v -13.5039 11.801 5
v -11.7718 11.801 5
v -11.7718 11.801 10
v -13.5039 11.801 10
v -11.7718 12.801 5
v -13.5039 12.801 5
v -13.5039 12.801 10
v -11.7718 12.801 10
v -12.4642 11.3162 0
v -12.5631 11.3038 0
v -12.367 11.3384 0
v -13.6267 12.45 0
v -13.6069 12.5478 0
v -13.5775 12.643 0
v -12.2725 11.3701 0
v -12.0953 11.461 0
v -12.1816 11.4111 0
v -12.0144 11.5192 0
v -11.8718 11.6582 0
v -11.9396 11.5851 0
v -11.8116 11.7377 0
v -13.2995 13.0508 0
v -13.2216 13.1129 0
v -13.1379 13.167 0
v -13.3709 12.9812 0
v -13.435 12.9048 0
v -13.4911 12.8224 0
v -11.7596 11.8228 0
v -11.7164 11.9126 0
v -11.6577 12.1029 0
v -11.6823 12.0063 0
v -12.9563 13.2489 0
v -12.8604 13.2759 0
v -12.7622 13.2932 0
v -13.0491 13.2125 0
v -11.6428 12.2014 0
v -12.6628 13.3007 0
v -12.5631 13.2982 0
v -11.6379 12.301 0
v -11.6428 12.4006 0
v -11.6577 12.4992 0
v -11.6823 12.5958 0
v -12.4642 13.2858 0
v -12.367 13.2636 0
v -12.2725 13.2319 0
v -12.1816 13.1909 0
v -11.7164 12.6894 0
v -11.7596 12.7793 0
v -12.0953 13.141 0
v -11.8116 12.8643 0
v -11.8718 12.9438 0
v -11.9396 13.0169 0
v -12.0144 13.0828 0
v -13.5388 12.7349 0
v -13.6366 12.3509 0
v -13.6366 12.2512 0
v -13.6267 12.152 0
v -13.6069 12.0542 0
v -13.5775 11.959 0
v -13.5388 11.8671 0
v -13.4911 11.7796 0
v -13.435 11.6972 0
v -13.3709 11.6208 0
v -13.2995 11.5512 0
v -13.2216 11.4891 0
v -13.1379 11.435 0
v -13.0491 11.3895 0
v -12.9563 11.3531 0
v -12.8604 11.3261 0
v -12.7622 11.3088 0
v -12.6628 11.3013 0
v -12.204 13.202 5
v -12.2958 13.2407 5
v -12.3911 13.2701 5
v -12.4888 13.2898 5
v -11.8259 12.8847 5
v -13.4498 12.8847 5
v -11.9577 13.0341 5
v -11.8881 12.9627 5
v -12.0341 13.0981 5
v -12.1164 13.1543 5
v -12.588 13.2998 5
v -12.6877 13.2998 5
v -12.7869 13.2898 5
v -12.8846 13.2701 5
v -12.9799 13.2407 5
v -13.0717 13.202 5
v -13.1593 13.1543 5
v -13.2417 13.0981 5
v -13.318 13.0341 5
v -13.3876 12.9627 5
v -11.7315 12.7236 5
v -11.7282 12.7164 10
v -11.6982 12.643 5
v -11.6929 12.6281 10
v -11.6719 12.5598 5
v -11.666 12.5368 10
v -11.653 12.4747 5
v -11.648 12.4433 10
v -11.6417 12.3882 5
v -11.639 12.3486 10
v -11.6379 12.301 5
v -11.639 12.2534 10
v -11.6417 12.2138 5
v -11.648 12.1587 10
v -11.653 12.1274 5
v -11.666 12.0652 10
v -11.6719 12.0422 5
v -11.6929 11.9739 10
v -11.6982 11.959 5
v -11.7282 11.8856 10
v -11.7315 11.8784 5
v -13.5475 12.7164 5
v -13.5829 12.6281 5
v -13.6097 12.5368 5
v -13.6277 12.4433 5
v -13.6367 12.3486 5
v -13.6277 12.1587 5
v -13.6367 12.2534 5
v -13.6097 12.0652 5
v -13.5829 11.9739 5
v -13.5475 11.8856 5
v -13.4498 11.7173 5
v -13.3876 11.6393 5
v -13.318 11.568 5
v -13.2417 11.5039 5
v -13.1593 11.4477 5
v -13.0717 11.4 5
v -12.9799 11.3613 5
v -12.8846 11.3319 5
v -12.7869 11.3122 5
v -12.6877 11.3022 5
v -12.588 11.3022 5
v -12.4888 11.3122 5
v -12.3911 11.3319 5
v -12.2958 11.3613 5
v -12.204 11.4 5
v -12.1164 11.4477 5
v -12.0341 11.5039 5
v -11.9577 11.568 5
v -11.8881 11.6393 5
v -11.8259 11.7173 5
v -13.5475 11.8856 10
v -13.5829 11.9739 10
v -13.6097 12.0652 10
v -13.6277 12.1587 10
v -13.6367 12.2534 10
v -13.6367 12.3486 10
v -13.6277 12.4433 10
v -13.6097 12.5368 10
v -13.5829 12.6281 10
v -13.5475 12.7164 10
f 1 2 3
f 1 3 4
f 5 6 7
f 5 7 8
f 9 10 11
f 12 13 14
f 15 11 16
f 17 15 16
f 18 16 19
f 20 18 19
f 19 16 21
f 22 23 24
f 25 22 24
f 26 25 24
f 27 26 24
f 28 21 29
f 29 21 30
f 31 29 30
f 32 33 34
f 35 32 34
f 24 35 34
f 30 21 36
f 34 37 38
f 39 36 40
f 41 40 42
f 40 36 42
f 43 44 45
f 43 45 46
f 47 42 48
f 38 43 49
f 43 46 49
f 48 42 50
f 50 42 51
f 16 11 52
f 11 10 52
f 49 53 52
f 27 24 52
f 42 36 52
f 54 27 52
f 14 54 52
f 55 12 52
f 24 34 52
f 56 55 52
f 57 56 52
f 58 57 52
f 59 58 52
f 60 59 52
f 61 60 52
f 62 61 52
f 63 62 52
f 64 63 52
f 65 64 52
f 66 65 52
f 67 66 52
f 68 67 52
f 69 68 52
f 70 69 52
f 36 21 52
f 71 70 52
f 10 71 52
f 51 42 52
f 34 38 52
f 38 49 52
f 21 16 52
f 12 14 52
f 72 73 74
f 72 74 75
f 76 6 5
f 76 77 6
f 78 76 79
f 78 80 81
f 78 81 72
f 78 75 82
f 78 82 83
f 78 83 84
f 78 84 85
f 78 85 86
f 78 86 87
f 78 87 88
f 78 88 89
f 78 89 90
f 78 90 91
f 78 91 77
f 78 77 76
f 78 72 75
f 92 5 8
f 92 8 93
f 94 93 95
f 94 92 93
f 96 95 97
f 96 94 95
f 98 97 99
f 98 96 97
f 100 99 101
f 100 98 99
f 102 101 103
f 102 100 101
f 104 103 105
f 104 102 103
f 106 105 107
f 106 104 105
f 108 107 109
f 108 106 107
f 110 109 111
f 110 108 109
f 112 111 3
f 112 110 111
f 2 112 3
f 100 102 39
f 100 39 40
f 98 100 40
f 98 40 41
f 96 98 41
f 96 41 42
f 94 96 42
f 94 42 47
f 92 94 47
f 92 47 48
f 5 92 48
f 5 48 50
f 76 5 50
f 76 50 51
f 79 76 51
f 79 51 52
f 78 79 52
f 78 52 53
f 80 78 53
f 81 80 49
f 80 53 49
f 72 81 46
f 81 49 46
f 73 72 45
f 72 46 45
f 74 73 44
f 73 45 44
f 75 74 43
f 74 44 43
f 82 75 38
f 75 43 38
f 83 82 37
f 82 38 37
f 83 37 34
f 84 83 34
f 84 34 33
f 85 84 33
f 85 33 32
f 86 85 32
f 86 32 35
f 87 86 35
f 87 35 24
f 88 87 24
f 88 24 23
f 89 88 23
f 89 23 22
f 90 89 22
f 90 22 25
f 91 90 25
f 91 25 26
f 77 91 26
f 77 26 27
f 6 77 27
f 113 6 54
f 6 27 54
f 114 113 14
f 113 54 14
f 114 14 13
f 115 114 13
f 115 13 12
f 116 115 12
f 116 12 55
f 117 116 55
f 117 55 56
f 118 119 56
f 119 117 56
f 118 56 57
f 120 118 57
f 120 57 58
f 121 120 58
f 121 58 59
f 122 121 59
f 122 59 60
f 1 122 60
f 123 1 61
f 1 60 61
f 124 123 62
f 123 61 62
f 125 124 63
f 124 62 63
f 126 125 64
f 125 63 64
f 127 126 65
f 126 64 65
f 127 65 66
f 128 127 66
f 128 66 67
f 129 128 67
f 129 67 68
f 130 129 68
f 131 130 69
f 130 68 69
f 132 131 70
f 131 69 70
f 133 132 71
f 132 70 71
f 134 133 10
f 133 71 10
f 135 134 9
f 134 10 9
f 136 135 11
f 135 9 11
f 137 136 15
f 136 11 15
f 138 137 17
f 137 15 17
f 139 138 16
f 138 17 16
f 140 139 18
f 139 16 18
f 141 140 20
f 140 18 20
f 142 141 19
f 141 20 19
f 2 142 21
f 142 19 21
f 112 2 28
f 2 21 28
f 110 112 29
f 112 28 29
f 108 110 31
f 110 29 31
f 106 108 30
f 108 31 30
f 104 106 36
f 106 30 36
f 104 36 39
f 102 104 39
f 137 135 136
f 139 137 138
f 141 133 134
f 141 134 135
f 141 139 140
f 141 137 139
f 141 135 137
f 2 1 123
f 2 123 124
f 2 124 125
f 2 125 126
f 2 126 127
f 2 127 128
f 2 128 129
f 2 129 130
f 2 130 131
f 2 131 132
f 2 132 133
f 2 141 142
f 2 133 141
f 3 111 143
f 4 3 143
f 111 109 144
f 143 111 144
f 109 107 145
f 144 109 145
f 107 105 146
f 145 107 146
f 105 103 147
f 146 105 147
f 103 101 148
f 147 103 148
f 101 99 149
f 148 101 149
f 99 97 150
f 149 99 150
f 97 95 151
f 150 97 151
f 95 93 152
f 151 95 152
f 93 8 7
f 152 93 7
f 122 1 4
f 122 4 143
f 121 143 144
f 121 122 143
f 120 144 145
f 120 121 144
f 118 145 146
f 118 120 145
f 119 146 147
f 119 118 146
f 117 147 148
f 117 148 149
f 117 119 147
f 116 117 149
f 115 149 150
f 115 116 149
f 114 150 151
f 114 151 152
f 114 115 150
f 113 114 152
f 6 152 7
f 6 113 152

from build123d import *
from build123d.topology import SkipClean

# Parameters (mm, degrees)
SKETCH_1_R      = 1
EXTRUDE_1_DEPTH = 5
EXTRUDE_2_DEPTH = 5


with BuildPart() as part:
    # 草图1 → 凸台-拉伸1 (new body)
    with BuildSketch(Plane.XY):
        with Locations((-12.637856913, 12.301005314)):
            Circle(SKETCH_1_R)
    extrude(amount=EXTRUDE_1_DEPTH)

    # 草图2 → 凸台-拉伸2 (add)
    with SkipClean():  # the faces are left unmerged after this step: merging them gives an invalid solid
        with BuildSketch(Plane.XY.offset(5)):
            with BuildLine():
                Line((-13.503882317, 12.801005314), (-11.771831509, 12.801005314))
                ThreePointArc((-11.771831509, 12.801005314), (-11.637856913, 12.301005314), (-11.771831509, 11.801005314))
                Line((-11.771831509, 11.801005314), (-13.503882317, 11.801005314))
                ThreePointArc((-13.503882317, 11.801005314), (-13.637856913, 12.301005314), (-13.503882317, 12.801005314))
            make_face()
        extrude(amount=EXTRUDE_2_DEPTH)


solid = part.part
